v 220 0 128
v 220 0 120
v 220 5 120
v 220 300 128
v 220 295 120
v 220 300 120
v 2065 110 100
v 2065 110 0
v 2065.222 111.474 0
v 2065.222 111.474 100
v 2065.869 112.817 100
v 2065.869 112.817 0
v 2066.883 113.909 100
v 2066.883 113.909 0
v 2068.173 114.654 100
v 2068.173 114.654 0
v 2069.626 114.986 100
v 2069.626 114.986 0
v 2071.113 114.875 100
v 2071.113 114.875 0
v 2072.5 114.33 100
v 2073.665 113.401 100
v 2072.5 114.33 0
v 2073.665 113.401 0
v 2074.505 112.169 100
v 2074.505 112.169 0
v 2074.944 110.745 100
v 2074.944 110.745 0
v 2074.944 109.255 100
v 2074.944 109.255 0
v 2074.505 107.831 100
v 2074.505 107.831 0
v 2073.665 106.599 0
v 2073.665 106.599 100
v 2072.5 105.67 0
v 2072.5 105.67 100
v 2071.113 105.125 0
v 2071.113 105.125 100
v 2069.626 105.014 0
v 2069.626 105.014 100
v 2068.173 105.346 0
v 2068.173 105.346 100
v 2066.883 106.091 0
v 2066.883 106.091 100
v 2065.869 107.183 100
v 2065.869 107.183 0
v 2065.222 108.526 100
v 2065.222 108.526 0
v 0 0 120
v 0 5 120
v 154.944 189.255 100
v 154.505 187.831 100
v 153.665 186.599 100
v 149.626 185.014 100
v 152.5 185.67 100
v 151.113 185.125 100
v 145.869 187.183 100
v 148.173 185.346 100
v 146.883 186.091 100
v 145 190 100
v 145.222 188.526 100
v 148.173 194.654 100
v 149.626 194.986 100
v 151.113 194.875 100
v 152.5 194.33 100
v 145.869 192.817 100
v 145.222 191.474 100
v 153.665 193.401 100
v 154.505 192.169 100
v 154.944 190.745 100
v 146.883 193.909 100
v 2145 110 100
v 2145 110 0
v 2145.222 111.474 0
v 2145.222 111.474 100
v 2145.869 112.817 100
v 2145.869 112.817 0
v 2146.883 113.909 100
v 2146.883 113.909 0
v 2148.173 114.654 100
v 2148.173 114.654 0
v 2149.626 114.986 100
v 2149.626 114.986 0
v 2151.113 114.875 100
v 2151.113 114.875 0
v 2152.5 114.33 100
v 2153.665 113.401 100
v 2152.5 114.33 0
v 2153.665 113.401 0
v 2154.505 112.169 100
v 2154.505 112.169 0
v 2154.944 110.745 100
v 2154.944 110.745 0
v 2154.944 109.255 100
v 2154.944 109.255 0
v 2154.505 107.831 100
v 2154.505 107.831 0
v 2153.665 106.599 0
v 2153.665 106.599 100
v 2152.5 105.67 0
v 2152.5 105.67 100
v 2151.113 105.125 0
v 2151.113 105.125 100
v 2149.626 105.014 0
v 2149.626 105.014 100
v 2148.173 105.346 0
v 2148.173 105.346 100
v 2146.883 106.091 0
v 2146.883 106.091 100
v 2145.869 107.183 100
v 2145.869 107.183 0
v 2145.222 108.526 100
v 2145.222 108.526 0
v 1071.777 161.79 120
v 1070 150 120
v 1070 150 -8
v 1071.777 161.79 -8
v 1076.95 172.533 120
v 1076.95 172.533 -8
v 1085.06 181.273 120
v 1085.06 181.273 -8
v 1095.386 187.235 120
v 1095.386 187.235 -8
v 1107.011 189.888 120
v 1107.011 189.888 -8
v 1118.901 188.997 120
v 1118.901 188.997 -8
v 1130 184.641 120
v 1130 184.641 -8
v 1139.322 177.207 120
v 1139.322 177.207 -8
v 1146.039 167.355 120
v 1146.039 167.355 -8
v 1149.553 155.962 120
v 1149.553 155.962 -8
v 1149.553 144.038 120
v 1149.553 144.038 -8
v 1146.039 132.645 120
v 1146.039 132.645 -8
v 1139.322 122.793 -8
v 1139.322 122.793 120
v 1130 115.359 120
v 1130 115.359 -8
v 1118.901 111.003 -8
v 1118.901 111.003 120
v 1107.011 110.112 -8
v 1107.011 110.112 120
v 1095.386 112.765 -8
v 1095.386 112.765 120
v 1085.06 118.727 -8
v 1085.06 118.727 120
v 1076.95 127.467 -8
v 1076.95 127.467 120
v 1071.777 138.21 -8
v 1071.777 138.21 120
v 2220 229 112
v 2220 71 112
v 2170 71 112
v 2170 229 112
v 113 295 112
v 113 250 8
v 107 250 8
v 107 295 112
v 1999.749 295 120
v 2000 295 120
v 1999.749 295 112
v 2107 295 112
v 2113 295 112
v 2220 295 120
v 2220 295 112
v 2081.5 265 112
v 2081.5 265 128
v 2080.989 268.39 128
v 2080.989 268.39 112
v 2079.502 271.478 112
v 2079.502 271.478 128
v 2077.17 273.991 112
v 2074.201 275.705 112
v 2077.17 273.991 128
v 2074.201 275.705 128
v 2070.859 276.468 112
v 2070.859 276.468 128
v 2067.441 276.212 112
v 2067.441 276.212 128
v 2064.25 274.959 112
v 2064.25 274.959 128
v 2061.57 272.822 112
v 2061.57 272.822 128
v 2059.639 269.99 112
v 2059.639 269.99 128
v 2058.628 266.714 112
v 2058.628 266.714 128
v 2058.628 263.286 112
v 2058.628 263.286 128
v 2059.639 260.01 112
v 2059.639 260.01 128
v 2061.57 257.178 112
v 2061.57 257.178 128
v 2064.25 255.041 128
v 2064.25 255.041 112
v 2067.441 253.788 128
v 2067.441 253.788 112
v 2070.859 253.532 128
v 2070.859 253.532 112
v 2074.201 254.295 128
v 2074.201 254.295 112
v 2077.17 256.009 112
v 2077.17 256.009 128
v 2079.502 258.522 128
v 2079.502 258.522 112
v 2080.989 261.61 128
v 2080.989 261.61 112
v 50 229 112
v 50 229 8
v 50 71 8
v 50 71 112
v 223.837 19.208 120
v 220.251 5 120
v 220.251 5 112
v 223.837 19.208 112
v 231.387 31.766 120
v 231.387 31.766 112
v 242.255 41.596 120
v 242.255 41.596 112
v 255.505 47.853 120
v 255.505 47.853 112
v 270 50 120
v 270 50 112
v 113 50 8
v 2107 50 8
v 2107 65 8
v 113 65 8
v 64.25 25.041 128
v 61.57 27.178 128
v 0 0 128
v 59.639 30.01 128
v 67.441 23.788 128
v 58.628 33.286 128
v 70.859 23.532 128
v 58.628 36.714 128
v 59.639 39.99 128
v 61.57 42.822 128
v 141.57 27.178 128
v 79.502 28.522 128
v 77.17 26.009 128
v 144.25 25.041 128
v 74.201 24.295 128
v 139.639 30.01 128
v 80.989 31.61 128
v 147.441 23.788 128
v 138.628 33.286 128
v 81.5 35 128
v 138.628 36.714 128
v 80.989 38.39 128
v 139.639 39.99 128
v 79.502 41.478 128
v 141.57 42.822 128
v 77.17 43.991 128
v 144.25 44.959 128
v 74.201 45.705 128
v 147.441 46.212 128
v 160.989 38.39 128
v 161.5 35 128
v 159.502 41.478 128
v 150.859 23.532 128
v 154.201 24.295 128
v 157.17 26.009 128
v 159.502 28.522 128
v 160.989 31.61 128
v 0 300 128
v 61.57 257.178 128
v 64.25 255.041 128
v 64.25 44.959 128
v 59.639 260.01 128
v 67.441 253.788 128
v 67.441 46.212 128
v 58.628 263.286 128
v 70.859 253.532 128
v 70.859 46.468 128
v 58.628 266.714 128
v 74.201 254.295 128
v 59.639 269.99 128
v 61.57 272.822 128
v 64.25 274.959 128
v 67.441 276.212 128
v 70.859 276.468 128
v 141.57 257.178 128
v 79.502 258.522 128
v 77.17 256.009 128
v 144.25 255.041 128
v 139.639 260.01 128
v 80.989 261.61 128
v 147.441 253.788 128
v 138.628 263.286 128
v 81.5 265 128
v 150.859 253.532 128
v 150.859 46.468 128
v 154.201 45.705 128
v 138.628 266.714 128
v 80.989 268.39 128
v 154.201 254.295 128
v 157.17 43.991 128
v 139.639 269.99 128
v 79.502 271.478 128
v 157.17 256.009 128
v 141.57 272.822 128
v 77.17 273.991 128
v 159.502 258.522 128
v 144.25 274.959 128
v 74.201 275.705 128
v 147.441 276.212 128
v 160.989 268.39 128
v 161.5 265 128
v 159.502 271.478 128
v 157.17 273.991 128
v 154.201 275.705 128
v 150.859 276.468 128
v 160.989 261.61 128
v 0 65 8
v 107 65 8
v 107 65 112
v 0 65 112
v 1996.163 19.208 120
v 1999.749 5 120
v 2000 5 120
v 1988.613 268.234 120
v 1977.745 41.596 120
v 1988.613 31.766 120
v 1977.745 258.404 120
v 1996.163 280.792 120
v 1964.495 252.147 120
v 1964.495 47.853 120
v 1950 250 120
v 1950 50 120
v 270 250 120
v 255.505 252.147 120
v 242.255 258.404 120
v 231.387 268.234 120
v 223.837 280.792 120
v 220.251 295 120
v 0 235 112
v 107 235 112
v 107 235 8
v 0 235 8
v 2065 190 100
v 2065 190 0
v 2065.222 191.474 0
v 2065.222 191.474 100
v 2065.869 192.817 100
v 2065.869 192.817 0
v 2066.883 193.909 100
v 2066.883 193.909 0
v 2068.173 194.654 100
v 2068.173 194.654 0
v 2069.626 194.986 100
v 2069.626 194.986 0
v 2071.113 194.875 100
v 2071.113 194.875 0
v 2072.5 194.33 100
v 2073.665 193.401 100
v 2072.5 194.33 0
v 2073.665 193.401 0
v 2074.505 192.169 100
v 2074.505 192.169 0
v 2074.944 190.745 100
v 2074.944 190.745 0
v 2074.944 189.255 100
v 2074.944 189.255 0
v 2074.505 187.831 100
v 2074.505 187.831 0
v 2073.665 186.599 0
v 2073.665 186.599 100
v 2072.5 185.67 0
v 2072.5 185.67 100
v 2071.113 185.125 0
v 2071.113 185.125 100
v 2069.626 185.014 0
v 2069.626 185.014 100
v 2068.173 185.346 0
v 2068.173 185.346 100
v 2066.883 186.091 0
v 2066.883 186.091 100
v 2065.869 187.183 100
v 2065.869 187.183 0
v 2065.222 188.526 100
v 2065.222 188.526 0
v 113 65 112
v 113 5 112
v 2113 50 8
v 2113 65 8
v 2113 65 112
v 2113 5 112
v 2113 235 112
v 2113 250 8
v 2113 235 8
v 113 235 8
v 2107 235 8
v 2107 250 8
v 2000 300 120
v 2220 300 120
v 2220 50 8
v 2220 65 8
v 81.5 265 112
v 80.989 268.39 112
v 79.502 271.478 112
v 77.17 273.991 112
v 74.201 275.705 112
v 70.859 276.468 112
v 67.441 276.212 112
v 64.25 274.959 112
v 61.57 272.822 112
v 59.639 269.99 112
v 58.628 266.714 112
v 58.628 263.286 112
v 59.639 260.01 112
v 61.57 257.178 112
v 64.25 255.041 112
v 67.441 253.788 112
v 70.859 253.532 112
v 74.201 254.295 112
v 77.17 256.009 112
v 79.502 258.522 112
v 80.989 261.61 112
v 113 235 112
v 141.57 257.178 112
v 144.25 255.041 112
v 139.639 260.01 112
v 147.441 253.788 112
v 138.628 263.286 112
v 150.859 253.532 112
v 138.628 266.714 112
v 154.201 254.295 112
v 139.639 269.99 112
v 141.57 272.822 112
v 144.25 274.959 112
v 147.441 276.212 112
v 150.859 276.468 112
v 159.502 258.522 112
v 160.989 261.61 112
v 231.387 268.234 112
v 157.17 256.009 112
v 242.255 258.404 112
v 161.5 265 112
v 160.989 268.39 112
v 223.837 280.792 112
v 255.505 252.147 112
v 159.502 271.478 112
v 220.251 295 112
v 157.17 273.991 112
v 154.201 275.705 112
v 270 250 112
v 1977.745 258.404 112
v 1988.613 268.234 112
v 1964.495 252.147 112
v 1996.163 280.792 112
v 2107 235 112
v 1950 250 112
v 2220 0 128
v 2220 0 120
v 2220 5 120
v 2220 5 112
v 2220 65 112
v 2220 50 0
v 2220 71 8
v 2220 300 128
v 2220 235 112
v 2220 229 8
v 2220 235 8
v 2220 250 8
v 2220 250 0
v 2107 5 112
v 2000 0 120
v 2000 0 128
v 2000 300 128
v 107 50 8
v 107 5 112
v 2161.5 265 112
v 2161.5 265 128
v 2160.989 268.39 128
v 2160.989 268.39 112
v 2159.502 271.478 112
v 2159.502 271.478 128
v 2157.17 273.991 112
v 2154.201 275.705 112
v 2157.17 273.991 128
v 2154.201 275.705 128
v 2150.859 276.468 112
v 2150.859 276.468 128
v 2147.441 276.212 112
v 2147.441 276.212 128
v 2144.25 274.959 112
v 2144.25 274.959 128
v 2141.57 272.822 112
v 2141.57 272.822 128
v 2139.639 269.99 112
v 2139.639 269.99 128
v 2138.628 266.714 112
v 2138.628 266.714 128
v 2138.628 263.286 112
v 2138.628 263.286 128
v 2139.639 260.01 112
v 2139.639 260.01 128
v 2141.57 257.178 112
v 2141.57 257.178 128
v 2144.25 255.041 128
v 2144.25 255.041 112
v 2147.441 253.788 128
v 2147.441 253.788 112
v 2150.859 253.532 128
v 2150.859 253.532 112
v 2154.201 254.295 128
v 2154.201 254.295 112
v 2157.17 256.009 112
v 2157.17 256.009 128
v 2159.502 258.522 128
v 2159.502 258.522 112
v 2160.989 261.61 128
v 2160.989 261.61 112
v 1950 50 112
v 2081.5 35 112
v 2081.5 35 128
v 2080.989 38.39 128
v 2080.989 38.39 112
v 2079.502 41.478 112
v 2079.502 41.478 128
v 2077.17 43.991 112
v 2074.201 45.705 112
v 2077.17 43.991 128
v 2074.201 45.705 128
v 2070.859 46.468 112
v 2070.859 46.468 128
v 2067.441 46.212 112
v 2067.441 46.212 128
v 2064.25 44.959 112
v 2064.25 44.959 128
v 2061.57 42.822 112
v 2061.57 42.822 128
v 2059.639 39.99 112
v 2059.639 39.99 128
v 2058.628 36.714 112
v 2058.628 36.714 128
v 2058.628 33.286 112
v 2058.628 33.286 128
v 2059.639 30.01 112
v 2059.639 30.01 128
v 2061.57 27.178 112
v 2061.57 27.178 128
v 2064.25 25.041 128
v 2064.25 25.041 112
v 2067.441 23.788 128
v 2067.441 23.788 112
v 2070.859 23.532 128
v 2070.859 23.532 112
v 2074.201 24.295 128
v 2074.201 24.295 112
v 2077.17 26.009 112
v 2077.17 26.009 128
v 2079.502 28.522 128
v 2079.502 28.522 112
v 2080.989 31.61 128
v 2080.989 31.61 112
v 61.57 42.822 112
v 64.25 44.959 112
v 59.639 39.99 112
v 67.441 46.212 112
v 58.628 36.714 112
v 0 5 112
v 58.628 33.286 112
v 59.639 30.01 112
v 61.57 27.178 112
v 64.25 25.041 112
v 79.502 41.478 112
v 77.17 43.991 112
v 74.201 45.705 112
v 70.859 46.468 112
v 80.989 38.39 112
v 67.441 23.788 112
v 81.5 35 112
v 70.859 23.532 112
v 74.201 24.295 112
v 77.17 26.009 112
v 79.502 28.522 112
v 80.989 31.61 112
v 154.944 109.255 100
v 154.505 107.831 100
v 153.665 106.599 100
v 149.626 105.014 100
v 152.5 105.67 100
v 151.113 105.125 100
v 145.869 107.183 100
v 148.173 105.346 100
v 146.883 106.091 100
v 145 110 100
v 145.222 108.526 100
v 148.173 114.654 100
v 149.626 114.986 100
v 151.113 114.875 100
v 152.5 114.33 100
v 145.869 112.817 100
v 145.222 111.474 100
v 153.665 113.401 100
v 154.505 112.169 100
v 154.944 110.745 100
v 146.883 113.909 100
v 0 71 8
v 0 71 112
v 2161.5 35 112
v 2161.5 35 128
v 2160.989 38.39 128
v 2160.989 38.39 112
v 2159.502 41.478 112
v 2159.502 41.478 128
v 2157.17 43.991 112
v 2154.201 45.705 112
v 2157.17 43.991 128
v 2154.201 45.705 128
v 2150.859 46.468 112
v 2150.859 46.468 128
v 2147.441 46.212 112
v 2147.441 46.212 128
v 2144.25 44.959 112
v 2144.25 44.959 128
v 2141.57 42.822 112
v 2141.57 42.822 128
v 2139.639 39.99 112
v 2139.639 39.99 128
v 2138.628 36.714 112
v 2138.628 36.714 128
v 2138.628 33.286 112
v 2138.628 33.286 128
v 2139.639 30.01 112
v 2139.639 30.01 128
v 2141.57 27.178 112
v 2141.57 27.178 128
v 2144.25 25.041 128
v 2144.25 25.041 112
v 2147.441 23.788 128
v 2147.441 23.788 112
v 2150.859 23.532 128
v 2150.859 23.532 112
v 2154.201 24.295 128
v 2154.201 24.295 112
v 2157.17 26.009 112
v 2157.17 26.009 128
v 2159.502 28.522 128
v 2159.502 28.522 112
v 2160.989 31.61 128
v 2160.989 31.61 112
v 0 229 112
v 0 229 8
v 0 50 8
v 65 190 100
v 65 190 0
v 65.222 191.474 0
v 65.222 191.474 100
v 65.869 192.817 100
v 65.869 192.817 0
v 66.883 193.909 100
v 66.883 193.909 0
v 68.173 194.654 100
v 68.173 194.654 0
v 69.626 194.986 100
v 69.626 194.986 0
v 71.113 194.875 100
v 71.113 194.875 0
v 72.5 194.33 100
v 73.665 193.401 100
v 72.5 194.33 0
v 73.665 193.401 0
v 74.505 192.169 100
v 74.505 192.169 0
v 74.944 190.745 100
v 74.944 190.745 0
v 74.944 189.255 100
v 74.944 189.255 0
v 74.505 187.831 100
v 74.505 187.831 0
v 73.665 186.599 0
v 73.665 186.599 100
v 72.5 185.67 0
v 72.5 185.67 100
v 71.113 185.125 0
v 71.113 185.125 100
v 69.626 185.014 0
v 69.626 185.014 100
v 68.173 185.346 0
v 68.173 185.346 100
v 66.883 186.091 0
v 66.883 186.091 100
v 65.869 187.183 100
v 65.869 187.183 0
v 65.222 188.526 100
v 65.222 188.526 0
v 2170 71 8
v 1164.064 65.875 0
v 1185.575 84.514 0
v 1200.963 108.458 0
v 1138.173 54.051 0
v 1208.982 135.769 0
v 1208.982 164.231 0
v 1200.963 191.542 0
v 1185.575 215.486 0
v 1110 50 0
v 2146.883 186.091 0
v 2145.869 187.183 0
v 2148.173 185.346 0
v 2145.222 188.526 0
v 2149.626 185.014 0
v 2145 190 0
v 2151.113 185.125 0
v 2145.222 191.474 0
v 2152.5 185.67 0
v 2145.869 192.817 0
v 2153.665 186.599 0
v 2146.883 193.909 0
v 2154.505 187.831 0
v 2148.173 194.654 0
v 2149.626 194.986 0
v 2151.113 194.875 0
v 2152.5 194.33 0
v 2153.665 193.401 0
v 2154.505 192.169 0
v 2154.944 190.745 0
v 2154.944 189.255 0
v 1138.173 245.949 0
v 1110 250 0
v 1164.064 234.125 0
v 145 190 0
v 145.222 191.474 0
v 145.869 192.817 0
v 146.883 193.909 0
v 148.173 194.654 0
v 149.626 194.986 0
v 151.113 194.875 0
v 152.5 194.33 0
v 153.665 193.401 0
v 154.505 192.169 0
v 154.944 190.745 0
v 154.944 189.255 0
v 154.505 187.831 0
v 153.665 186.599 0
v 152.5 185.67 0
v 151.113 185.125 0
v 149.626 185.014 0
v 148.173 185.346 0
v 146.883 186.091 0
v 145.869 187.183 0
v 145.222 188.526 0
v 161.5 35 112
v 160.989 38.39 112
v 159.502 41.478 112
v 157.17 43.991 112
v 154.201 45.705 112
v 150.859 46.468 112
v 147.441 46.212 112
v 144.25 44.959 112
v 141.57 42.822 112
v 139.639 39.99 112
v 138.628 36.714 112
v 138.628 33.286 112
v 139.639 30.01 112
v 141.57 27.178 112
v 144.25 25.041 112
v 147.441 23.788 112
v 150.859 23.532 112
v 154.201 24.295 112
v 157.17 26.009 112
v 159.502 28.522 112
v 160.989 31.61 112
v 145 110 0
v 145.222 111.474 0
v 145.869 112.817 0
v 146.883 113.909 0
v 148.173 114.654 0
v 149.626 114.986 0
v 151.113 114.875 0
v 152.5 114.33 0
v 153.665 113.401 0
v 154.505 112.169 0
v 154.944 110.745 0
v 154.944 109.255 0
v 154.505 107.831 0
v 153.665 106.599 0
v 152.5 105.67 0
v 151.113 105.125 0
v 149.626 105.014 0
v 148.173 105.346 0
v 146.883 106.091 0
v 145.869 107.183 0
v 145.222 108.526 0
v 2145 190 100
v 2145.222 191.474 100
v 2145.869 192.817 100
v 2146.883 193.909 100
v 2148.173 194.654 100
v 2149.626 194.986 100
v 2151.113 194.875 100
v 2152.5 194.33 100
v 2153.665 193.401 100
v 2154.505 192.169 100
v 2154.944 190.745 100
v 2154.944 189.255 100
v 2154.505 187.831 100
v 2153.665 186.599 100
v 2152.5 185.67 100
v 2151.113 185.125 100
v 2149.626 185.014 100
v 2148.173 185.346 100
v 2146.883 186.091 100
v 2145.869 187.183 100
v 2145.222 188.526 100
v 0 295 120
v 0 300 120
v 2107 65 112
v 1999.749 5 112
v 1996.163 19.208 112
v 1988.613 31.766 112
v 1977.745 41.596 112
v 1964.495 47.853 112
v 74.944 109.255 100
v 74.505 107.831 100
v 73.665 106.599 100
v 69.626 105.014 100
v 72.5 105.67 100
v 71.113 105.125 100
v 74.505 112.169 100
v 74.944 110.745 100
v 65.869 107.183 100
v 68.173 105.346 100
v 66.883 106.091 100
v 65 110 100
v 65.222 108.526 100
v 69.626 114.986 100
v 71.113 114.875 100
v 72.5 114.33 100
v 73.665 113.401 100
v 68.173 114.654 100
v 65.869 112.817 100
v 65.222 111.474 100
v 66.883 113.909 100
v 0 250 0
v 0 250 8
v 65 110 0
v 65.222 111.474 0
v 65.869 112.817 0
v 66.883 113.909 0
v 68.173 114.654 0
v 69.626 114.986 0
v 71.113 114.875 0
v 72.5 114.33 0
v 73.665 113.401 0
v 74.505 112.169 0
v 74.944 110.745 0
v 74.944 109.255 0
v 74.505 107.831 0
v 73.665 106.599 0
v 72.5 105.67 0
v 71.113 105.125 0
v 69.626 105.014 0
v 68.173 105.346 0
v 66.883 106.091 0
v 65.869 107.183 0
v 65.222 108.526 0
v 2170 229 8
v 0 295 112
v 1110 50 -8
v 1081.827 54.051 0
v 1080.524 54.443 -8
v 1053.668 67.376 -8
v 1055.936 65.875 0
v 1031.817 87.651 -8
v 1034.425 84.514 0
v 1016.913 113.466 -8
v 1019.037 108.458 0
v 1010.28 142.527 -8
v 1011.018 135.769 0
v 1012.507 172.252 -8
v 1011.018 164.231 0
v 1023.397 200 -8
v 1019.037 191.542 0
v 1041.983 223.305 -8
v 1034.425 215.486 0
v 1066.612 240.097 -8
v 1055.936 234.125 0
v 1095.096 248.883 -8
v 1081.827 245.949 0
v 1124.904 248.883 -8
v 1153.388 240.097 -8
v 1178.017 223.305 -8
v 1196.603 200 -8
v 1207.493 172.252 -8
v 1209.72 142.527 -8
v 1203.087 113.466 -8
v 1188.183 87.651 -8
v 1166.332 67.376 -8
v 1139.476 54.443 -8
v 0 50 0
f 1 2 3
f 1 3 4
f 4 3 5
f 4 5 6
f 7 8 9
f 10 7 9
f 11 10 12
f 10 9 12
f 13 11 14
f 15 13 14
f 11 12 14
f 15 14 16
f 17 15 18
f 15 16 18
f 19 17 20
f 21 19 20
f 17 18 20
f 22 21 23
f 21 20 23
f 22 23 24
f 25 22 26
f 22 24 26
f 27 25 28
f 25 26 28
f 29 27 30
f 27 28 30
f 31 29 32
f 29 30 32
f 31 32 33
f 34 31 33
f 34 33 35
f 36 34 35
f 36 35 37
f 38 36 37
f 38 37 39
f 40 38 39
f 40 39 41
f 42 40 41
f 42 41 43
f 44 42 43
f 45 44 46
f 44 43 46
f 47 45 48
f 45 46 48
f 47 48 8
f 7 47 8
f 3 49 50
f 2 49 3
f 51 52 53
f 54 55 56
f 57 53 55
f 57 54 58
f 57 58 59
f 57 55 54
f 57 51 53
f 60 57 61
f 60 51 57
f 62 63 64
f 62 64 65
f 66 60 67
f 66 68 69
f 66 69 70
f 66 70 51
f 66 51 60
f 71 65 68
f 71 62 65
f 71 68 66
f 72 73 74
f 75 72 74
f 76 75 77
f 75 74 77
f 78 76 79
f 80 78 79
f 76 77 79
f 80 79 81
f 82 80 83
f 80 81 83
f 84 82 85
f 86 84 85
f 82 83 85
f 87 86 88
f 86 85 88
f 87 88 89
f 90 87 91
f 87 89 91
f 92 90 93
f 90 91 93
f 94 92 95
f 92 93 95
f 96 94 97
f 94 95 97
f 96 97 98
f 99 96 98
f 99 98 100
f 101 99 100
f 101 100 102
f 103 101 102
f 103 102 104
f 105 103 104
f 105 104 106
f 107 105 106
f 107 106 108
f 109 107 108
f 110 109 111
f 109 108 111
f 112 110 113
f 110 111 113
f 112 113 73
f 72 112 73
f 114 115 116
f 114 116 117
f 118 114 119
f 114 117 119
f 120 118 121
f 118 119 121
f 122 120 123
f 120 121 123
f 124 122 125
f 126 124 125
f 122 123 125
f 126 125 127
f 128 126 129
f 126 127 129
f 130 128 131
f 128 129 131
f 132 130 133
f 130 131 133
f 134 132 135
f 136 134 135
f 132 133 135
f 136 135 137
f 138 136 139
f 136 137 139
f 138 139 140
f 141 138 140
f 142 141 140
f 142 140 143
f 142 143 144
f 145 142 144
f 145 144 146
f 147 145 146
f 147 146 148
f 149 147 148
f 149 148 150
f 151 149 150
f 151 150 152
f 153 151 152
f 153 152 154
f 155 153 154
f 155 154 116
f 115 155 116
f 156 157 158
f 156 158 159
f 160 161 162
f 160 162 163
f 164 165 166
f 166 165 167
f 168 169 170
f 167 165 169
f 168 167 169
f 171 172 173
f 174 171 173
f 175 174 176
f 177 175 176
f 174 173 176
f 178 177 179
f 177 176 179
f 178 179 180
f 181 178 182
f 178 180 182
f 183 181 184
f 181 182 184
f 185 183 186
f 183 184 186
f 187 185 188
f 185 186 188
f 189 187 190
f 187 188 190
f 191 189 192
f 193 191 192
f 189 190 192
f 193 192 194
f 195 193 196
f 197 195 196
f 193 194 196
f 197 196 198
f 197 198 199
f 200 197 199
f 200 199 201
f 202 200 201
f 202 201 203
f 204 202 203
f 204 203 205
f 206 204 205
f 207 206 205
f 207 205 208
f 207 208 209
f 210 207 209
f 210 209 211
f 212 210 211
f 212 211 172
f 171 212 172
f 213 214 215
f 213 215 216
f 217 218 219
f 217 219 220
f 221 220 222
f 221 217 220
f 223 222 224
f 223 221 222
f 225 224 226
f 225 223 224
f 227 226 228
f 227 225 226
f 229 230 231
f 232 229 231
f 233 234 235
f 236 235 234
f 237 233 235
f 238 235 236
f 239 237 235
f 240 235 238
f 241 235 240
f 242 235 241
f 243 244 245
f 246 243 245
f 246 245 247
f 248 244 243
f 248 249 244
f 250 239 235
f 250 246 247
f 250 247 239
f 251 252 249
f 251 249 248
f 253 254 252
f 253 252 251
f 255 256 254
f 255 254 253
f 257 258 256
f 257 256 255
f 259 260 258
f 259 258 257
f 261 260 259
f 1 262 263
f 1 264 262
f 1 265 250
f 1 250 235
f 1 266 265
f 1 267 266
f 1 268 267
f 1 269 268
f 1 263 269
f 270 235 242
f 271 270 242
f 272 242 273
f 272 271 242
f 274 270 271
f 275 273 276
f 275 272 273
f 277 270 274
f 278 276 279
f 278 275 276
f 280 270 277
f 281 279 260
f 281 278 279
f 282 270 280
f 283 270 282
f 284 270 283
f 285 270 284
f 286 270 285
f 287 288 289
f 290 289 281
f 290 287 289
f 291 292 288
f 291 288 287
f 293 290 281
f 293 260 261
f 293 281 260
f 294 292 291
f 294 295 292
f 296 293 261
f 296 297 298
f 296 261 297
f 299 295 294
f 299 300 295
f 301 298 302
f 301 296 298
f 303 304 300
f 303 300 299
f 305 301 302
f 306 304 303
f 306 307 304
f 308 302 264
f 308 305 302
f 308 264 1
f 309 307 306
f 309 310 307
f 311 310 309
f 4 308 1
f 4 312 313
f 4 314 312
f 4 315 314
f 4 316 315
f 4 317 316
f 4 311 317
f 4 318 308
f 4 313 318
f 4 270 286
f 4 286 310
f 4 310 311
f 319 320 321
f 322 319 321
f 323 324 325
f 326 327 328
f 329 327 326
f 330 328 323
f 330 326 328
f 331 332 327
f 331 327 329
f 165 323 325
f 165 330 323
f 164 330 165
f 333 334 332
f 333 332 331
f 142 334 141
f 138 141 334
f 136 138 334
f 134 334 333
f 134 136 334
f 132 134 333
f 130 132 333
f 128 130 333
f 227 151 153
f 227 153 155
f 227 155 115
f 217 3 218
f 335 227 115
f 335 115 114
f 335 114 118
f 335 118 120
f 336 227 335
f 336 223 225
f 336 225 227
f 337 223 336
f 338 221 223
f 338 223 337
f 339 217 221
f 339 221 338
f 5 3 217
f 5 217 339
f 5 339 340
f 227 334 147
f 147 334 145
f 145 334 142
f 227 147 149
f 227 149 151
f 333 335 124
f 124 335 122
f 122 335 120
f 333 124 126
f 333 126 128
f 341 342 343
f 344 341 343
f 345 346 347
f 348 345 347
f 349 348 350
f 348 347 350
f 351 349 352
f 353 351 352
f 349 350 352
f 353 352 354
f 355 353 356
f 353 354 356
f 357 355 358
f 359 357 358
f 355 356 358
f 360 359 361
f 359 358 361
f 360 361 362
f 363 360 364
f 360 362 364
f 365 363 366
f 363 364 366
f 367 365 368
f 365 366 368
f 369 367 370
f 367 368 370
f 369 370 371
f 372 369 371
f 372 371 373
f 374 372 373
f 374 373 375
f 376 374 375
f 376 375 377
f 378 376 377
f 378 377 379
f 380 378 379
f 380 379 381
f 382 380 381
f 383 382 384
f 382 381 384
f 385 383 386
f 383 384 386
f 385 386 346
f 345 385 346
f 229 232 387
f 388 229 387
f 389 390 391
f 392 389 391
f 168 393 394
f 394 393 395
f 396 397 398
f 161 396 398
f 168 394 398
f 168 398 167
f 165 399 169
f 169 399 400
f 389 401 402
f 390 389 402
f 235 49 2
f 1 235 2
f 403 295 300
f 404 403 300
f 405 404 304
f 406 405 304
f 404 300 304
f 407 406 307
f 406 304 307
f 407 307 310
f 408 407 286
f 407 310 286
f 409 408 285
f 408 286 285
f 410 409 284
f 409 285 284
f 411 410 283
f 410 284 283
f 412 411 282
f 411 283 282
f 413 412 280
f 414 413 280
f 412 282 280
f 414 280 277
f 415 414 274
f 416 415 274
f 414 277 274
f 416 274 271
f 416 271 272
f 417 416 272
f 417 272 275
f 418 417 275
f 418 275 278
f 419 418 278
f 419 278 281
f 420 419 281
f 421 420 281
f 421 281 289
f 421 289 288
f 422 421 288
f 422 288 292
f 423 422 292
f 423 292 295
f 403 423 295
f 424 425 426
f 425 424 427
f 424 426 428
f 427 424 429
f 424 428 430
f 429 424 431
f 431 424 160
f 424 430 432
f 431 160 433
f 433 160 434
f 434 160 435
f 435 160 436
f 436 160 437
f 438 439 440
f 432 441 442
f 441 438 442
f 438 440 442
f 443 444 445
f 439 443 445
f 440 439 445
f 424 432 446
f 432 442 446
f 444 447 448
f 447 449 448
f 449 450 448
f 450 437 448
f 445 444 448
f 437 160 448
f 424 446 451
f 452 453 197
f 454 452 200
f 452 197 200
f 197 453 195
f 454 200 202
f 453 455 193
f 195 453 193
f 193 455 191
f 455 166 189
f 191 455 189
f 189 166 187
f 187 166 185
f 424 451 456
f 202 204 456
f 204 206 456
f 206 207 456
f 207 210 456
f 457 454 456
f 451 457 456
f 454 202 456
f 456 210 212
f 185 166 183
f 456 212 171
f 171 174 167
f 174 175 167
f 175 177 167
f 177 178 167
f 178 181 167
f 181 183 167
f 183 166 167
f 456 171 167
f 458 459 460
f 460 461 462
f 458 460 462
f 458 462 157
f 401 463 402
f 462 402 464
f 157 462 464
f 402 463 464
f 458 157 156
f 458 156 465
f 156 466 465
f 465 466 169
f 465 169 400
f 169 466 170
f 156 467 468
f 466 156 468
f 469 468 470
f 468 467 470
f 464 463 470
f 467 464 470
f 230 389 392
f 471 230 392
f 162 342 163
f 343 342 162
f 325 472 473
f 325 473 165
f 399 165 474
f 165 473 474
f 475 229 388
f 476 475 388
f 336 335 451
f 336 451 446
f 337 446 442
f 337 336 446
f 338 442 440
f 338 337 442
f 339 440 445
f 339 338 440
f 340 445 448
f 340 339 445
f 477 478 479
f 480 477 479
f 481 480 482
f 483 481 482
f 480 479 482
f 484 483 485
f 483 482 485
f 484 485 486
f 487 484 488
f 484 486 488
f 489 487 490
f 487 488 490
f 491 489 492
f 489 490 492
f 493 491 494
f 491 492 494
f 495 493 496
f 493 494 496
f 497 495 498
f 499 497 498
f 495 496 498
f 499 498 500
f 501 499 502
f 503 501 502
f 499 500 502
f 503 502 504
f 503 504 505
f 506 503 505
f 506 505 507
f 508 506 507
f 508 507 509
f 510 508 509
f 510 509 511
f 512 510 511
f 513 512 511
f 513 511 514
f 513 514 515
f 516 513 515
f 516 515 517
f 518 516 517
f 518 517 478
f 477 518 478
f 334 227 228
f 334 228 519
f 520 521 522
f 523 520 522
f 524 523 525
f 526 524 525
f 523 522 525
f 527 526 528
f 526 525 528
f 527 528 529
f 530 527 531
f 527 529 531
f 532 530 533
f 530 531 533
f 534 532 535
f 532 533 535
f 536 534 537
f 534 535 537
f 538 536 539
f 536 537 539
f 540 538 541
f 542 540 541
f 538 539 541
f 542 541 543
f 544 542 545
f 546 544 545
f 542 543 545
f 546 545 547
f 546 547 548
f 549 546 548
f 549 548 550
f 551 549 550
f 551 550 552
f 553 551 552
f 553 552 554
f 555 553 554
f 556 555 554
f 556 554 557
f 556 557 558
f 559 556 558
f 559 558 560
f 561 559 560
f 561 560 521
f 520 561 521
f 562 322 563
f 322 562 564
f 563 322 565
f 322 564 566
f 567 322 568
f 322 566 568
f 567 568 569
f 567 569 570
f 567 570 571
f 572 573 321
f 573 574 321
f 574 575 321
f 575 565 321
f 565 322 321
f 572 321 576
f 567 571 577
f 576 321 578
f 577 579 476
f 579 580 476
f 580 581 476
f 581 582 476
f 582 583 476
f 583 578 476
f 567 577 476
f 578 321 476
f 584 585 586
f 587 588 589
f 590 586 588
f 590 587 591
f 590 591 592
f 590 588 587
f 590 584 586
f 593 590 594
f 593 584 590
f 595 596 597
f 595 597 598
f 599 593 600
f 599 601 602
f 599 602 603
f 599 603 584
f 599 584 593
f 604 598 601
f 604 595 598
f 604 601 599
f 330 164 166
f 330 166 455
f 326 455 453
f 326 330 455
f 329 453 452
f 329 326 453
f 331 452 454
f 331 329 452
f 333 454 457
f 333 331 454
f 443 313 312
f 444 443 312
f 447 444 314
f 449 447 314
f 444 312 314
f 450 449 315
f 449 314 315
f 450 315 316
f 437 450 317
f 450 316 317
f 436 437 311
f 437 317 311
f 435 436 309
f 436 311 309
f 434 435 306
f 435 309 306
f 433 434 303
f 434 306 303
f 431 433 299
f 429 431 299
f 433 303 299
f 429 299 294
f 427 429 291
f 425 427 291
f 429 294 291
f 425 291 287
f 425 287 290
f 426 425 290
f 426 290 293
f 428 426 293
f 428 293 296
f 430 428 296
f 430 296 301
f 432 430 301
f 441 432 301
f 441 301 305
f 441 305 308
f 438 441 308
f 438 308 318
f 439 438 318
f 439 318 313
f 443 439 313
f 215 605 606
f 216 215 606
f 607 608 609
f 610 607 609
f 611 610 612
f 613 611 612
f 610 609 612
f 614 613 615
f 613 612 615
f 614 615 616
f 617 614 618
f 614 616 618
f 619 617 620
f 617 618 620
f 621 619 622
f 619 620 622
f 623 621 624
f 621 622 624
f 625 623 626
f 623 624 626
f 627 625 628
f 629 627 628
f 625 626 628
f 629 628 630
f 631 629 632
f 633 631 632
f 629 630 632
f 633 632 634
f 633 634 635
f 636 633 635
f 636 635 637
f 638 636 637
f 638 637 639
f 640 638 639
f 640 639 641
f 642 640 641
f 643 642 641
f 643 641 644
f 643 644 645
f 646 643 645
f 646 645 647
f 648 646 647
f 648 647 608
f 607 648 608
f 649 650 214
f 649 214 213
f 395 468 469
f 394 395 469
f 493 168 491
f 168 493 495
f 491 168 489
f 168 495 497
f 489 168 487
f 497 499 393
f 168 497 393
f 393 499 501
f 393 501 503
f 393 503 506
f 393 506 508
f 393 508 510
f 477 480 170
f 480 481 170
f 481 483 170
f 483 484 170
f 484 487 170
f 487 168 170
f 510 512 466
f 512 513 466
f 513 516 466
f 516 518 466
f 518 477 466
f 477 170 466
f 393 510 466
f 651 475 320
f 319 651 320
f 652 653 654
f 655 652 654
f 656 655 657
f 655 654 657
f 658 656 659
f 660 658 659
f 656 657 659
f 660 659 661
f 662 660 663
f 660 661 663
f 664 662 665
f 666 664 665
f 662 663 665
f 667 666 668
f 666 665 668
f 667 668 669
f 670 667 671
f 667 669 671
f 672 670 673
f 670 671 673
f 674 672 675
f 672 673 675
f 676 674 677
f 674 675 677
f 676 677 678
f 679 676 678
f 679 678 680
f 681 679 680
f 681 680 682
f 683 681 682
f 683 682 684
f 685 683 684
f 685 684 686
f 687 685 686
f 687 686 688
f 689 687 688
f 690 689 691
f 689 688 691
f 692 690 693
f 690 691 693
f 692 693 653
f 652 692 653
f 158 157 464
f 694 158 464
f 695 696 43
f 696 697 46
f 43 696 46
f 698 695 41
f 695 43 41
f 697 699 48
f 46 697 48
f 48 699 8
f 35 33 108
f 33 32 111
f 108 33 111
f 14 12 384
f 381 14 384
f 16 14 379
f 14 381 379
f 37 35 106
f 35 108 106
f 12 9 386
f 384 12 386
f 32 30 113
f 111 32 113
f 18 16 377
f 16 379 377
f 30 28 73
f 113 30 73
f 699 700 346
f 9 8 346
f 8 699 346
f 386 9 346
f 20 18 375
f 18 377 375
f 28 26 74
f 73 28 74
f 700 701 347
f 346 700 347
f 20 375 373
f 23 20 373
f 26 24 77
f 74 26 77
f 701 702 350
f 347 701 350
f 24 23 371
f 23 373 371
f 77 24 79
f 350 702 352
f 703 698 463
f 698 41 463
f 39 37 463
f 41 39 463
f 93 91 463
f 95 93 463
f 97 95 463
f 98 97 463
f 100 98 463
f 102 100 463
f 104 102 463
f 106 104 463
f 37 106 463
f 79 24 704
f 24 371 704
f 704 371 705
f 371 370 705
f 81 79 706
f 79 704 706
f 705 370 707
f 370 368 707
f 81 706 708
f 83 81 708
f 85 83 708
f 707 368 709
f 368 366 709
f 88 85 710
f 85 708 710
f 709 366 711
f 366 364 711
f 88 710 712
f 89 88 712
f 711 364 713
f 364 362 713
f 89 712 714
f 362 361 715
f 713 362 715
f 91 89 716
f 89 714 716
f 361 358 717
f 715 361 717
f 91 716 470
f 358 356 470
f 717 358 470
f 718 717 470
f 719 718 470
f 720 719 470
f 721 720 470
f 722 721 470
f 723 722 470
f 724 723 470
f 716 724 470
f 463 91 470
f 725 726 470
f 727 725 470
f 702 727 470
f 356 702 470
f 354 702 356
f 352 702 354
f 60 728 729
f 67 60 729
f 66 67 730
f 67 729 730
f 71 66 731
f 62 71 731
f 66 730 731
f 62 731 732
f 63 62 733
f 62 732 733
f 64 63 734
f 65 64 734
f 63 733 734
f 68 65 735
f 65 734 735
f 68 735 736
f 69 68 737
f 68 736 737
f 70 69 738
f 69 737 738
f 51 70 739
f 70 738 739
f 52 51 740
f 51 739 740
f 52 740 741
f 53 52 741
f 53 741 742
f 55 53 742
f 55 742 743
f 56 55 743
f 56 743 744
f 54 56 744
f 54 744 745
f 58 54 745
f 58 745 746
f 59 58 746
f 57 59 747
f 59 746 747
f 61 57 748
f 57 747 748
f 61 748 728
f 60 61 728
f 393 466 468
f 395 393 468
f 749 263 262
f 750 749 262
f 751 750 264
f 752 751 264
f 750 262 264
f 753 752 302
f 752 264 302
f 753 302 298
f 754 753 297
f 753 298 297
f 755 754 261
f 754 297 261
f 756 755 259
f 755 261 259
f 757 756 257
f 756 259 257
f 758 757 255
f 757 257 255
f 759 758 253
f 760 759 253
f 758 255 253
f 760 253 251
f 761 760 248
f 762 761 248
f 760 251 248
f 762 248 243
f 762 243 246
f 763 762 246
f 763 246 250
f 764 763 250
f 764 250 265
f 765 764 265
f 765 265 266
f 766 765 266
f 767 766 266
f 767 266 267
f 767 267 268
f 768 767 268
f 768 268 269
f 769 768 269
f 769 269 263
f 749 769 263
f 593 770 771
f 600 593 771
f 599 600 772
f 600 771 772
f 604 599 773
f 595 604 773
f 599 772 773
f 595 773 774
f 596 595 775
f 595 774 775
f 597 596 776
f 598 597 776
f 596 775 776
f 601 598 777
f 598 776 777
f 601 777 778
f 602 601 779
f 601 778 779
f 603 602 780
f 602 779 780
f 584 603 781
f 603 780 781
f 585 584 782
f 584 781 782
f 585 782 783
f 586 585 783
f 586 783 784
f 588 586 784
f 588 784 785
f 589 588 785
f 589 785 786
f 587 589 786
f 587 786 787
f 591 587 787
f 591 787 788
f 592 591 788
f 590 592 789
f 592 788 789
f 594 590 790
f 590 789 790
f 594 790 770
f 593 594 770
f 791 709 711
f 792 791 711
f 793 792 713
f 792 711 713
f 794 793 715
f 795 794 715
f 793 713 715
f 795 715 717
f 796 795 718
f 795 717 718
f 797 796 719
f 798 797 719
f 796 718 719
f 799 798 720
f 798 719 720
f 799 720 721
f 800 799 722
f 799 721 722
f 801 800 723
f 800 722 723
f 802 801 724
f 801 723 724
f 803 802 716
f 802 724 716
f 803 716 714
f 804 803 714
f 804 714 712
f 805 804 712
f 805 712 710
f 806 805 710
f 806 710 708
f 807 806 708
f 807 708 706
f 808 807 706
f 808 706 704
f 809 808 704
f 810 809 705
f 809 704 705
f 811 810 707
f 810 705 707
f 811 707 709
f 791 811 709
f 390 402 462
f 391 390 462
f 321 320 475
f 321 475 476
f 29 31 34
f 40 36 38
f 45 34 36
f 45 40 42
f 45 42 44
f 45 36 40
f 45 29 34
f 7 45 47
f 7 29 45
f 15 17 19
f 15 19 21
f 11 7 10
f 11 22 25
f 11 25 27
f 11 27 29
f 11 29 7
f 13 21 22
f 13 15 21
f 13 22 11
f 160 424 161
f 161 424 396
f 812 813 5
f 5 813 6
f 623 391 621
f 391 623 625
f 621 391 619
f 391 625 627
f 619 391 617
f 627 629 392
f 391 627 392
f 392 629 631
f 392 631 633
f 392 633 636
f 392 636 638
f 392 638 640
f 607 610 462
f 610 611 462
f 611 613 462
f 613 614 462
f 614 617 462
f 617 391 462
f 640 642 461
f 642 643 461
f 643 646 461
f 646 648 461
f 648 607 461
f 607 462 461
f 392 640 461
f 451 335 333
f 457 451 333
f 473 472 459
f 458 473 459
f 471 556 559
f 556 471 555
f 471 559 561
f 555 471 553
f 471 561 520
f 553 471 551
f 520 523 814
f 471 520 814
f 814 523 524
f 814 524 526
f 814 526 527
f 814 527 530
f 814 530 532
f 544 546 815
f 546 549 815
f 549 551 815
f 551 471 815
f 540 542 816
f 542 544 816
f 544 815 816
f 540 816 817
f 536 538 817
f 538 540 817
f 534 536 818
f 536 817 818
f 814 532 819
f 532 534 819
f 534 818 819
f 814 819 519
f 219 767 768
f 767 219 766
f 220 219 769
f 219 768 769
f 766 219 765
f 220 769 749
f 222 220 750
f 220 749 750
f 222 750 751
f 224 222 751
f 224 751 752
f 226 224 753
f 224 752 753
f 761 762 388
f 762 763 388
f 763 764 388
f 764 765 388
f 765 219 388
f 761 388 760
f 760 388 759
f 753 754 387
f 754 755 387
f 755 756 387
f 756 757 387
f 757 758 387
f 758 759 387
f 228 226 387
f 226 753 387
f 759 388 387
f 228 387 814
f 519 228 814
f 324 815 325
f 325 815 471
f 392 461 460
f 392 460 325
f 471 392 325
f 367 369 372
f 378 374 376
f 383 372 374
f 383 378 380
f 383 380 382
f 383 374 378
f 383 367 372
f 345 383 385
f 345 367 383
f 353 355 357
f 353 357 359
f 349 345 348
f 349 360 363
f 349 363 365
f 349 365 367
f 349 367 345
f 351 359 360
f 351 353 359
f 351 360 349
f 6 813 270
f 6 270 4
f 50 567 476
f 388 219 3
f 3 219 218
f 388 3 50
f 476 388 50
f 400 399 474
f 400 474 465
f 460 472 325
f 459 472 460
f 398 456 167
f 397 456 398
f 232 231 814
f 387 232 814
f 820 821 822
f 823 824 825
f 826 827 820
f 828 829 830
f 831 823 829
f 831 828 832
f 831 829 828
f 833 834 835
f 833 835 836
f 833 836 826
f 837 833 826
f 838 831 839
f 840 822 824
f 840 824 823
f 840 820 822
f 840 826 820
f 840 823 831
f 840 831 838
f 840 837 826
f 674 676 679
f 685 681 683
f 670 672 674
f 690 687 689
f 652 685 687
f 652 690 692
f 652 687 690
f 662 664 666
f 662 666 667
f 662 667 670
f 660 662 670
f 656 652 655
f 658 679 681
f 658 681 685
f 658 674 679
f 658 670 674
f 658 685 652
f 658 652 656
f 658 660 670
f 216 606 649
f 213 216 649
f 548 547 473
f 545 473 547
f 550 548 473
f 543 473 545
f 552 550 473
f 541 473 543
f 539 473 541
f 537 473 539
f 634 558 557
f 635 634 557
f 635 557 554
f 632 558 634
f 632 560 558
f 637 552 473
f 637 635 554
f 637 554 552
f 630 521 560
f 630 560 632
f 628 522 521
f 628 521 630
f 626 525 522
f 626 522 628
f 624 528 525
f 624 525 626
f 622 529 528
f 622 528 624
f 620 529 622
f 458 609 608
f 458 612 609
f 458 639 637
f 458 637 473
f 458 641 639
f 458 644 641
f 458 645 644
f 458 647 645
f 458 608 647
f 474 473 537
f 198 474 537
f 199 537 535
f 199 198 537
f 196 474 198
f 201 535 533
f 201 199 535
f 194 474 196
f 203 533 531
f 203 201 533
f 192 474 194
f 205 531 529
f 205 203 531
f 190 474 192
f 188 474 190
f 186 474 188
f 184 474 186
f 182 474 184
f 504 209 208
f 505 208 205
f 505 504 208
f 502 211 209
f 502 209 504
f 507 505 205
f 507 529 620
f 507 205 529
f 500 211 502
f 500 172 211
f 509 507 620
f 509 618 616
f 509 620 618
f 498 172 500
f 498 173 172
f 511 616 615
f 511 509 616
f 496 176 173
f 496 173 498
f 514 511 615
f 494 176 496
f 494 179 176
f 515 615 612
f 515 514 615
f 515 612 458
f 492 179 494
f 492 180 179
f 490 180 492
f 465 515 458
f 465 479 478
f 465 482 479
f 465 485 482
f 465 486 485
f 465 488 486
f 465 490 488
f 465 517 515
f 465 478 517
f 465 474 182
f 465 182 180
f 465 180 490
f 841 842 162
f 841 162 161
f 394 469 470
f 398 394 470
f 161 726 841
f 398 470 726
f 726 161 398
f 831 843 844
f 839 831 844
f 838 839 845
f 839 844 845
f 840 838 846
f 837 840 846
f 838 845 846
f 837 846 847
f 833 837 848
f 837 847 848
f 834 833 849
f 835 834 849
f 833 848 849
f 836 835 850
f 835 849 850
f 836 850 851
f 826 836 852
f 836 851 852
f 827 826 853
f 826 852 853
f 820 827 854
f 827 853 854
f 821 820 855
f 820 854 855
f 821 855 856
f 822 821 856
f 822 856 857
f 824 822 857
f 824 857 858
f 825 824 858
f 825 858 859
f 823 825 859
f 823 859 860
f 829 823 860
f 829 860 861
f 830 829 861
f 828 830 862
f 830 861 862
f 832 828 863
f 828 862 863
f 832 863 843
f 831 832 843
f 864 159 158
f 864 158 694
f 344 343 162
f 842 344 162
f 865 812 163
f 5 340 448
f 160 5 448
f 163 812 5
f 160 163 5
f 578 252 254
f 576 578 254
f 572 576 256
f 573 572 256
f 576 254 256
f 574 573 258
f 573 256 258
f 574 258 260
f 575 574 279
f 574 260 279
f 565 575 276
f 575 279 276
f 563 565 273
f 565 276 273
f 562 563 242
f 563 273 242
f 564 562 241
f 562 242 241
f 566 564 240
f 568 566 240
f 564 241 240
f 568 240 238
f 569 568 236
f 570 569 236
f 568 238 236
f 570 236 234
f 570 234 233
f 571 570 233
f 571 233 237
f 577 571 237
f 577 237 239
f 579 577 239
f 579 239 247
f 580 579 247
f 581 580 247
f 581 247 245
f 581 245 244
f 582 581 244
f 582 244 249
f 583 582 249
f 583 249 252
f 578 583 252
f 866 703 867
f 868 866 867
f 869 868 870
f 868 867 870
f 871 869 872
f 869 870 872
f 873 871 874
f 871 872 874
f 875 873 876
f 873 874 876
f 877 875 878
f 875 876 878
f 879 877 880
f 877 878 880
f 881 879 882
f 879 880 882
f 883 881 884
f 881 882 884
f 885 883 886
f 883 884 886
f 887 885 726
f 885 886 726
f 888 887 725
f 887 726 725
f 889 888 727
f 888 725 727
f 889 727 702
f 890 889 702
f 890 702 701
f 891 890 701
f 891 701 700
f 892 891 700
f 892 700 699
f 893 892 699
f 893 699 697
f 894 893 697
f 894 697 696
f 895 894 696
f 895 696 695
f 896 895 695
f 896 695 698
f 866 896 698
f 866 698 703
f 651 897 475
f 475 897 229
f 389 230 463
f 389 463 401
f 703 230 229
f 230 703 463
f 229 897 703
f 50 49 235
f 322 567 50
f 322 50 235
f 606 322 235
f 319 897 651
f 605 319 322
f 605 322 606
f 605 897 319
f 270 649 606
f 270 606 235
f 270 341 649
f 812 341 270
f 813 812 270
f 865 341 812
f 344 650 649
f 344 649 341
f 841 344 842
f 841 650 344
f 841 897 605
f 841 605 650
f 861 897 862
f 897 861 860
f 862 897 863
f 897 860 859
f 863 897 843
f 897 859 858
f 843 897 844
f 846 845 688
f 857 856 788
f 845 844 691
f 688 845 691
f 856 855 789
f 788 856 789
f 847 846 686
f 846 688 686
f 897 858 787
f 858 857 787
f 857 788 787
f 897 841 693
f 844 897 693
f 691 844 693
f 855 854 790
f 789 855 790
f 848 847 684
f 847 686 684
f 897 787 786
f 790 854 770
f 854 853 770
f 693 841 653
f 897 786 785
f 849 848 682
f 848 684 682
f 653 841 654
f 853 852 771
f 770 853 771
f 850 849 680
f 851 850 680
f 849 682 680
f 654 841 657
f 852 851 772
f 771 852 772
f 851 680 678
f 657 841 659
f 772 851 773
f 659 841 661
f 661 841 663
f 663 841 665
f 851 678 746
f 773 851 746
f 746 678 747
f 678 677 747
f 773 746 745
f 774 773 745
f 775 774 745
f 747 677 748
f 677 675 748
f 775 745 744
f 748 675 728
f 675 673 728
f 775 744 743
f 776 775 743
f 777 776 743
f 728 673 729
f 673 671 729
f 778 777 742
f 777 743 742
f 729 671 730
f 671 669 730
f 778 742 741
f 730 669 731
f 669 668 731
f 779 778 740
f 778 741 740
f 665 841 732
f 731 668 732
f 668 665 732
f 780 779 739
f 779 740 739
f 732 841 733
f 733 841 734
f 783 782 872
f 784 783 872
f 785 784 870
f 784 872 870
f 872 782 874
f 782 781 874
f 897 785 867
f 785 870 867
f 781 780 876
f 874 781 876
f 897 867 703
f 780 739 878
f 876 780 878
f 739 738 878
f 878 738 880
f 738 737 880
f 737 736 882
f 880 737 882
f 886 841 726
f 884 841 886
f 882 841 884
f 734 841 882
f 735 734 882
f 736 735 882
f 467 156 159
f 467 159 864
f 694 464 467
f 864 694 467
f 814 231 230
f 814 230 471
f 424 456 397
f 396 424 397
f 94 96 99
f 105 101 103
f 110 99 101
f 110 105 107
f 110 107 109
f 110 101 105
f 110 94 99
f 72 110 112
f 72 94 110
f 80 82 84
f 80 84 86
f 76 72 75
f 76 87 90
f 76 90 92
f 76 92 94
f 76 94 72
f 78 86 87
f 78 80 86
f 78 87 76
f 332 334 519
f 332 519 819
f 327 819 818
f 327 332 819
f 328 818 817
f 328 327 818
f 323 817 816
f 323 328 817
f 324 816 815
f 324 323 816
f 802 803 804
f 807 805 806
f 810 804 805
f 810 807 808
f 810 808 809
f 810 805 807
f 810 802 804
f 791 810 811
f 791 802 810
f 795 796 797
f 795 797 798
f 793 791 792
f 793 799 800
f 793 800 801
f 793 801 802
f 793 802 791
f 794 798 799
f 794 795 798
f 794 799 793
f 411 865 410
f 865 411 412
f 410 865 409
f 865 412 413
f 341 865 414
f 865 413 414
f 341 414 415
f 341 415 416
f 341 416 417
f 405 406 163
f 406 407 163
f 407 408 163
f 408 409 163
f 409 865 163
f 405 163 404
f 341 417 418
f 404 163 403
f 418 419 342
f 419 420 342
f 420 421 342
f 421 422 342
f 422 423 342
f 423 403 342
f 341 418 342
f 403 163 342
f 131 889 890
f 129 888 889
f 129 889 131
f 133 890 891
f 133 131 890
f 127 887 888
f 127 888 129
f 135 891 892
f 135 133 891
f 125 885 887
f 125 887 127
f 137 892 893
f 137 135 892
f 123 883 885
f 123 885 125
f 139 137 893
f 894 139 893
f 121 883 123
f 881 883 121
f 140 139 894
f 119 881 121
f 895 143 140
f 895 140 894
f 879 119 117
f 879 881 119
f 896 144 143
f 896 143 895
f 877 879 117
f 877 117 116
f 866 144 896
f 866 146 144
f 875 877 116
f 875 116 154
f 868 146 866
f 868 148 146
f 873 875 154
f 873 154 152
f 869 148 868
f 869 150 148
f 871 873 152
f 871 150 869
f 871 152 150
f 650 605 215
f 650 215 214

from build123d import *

# Parameters (mm, degrees)
SKETCH_1_W                       = 2220
SKETCH_1_H                       = 300
EXTRUDE_1_DEPTH                  = 120
SKETCH_2_W                       = 1780
SKETCH_2_H                       = 50
CUT_EXTRUDE_1_DEPTH              = 2244.390291501
SKETCH_3_W                       = 220
SKETCH_3_H                       = 300
EXTRUDE_2_DEPTH                  = 8
SKETCH_4_W                       = 2220
SKETCH_4_H                       = 120
CUT_EXTRUDE_2_DEPTH              = 5
SKETCH_5_W                       = 2220
SKETCH_5_H                       = 120
CUT_EXTRUDE_3_DEPTH              = 5
CUT_EXTRUDE_11_DEPTH             = 2244.832435812
SKETCH_14_W                      = 6
SKETCH_14_H                      = 104
EXTRUDE_3_DEPTH                  = 60
SKETCH_16_W                      = 6
SKETCH_16_H                      = 104
EXTRUDE_4_DEPTH                  = 60
CUT_EXTRUDE_12_DEPTH             = 2139.025490961
PATTERN_LINEAR_2_COUNT           = 2
PATTERN_LINEAR_2_PITCH           = 2000
FILLET_3_R                       = 50
SKETCH_17_W                      = 104
SKETCH_17_H                      = 158
CUT_EXTRUDE_13_DEPTH             = 50
SKETCH_18_W                      = 104
SKETCH_18_H                      = 158
CUT_EXTRUDE_14_DEPTH             = 50
SKETCH_19_R                      = 100
EXTRUDE_5_DEPTH                  = 8
SKETCH_20_R                      = 40
CUT_EXTRUDE_15_DEPTH             = 2245.303009845
SKETCH_21_R                      = 11.5
CUT_EXTRUDE_16_DEPTH             = 2245.303009845
PATTERN_LINEAR_3_COUNT           = 2
PATTERN_LINEAR_3_PITCH           = 80
PATTERN_LINEAR_3_COUNT_DIR2      = 2
PATTERN_LINEAR_3_PITCH_DIR2      = 230
PATTERN_LINEAR_4_COUNT           = 2
PATTERN_LINEAR_4_PITCH           = 2000
PATTERN_LINEAR_4_COPY_1_SKETCH_R = 11.5
PATTERN_LINEAR_4_COPY_1_DEPTH    = 2245.303009845
PATTERN_LINEAR_4_COPY_2_SKETCH_R = 11.5
PATTERN_LINEAR_4_COPY_2_DEPTH    = 2245.303009845
PATTERN_LINEAR_4_COPY_3_SKETCH_R = 11.5
PATTERN_LINEAR_4_COPY_3_DEPTH    = 2245.303009845
SKETCH_22_R                      = 5
CUT_EXTRUDE_17_DEPTH             = 100
PATTERN_LINEAR_5_COUNT           = 2
PATTERN_LINEAR_5_PITCH           = 80
PATTERN_LINEAR_5_COUNT_DIR2      = 2
PATTERN_LINEAR_5_PITCH_DIR2      = 80
PATTERN_LINEAR_6_COUNT           = 2
PATTERN_LINEAR_6_PITCH           = 2000
PATTERN_LINEAR_6_COPY_1_SKETCH_R = 5
PATTERN_LINEAR_6_COPY_1_DEPTH    = 100
PATTERN_LINEAR_6_COPY_2_SKETCH_R = 5
PATTERN_LINEAR_6_COPY_2_DEPTH    = 100
PATTERN_LINEAR_6_COPY_3_SKETCH_R = 5
PATTERN_LINEAR_6_COPY_3_DEPTH    = 100


with BuildPart() as part:
    # 草图1 → 凸台-拉伸1 (new body)
    with BuildSketch(Plane.XY):
        with Locations((1110, 150)):
            Rectangle(SKETCH_1_W, SKETCH_1_H)
    extrude(amount=EXTRUDE_1_DEPTH)

    # 草图2 → 切除-拉伸1 (cut, through all)
    with BuildSketch(Plane.XY.offset(120)):
        with Locations((1110, 275)):
            Rectangle(SKETCH_2_W, SKETCH_2_H)
        with Locations((1110, 25)):
            Rectangle(SKETCH_2_W, SKETCH_2_H)
    extrude(amount=-CUT_EXTRUDE_1_DEPTH, mode=Mode.SUBTRACT)

    # 草图3 → 凸台-拉伸2 (add)
    with BuildSketch(Plane.XY.offset(120)):
        with Locations((110, 150)):
            Rectangle(SKETCH_3_W, SKETCH_3_H)
        with Locations((2110, 150)):
            Rectangle(SKETCH_3_W, SKETCH_3_H)
    extrude(amount=EXTRUDE_2_DEPTH)

    # 草图4 → 切除-拉伸2 (cut)
    with BuildSketch(Plane(origin=(0, 300, 0), x_dir=(1, 0, 0), z_dir=(0, 1, 0))):
        with Locations((1110, -60)):
            Rectangle(SKETCH_4_W, SKETCH_4_H)
    extrude(amount=-CUT_EXTRUDE_2_DEPTH, mode=Mode.SUBTRACT)

    # 草图5 → 切除-拉伸3 (cut)
    with BuildSketch(Plane.XZ):
        with Locations((1110, 60)):
            Rectangle(SKETCH_5_W, SKETCH_5_H)
    extrude(amount=-CUT_EXTRUDE_3_DEPTH, mode=Mode.SUBTRACT)

    # 草图13 → 切除-拉伸11 (cut, through all)
    with BuildSketch(Plane(origin=(2220, 0, 0), x_dir=(0, 0, -1), z_dir=(1, 0, 0))):
        Polygon((-112, 235), (-8, 235), (-8, 250), (0, 250), (0, 295), (-112, 295), align=None)
        Polygon((-112, 5), (0, 5), (0, 50), (-8, 50), (-8, 65), (-112, 65), align=None)
    extrude(amount=-CUT_EXTRUDE_11_DEPTH, mode=Mode.SUBTRACT)

    # 草图14 → 凸台-拉伸3 (add)
    with BuildSketch(Plane(origin=(0, 235, 0), x_dir=(1, 0, 0), z_dir=(0, 1, 0))):
        with Locations((2110, -60)):
            Rectangle(SKETCH_14_W, SKETCH_14_H)
    extrude_3 = extrude(amount=EXTRUDE_3_DEPTH)

    # 草图16 → 凸台-拉伸4 (add)
    with BuildSketch(Plane.XZ.offset(-65)):
        with Locations((2110, 60)):
            Rectangle(SKETCH_16_W, SKETCH_16_H)
    extrude_4 = extrude(amount=EXTRUDE_4_DEPTH)

    # 草图15 → 切除-拉伸12 (cut, through all)
    with BuildSketch(Plane(origin=(2113, 0, 0), x_dir=(0, 0, -1), z_dir=(1, 0, 0))):
        Polygon((-8, 295), (-8, 250), (-112, 295), align=None)
        Polygon((-8, 50), (-112, 5), (-8, 5), align=None)
    cut_extrude_12 = extrude(amount=-CUT_EXTRUDE_12_DEPTH, mode=Mode.SUBTRACT)

    # 阵列(线性)2: 凸台-拉伸3, 凸台-拉伸4, 切除-拉伸12 ×2
    with Locations(*[(-i * PATTERN_LINEAR_2_PITCH, 0, 0) for i in range(1, PATTERN_LINEAR_2_COUNT)]):
        add(extrude_3)
        add(extrude_4)
        add(cut_extrude_12, mode=Mode.SUBTRACT)

    # 圆角3
    # the kernel refuses this fillet: 50 mm, written as the material it adds along each edge
    with BuildSketch(Plane(origin=(220, 250, 120), x_dir=(0, 1, 0), z_dir=(0, 0, -1))) as fillet_3_piece_1_section:
        with BuildLine():
            CenterArc((FILLET_3_R, FILLET_3_R), FILLET_3_R, 180, 90)
            Line((0, FILLET_3_R), (0, 0))
            Line((0, 0), (FILLET_3_R, 0))
        make_face()
    fillet_3_piece_1 = extrude(amount=8, mode=Mode.PRIVATE)
    fillet_3_piece_1 = split(fillet_3_piece_1, bisect_by=Plane(origin=(231.177032, 295, 116), z_dir=(0, -1, 0)), keep=Keep.TOP, mode=Mode.PRIVATE)
    add(fillet_3_piece_1)
    with BuildSketch(Plane(origin=(2000, 250, 120), x_dir=(-1, 0, 0), z_dir=(0, 0, -1))) as fillet_3_piece_2_section:
        with BuildLine():
            CenterArc((FILLET_3_R, FILLET_3_R), FILLET_3_R, 180, 90)
            Line((0, FILLET_3_R), (0, 0))
            Line((0, 0), (FILLET_3_R, 0))
        make_face()
    fillet_3_piece_2 = extrude(amount=8, mode=Mode.PRIVATE)
    fillet_3_piece_2 = split(fillet_3_piece_2, bisect_by=Plane(origin=(1988.822968, 295, 116), z_dir=(0, -1, 0)), keep=Keep.TOP, mode=Mode.PRIVATE)
    add(fillet_3_piece_2)
    with BuildSketch(Plane(origin=(2000, 50, 120), x_dir=(-1, 0, 0), z_dir=(0, 0, -1))) as fillet_3_piece_3_section:
        with BuildLine():
            CenterArc((FILLET_3_R, -FILLET_3_R), FILLET_3_R, 90, 90)
            Line((0, -FILLET_3_R), (0, 0))
            Line((0, 0), (FILLET_3_R, 0))
        make_face()
    fillet_3_piece_3 = extrude(amount=8, mode=Mode.PRIVATE)
    fillet_3_piece_3 = split(fillet_3_piece_3, bisect_by=Plane(origin=(1988.822968, 5, 116), z_dir=(0, 1, 0)), keep=Keep.TOP, mode=Mode.PRIVATE)
    add(fillet_3_piece_3)
    with BuildSketch(Plane(origin=(220, 50, 120), x_dir=(0, -1, 0), z_dir=(0, 0, -1))) as fillet_3_piece_4_section:
        with BuildLine():
            CenterArc((FILLET_3_R, -FILLET_3_R), FILLET_3_R, 90, 90)
            Line((0, -FILLET_3_R), (0, 0))
            Line((0, 0), (FILLET_3_R, 0))
        make_face()
    fillet_3_piece_4 = extrude(amount=8, mode=Mode.PRIVATE)
    fillet_3_piece_4 = split(fillet_3_piece_4, bisect_by=Plane(origin=(231.177032, 5, 116), z_dir=(0, 1, 0)), keep=Keep.TOP, mode=Mode.PRIVATE)
    add(fillet_3_piece_4)

    # 草图17 → 切除-拉伸13 (cut)
    with BuildSketch(Plane.ZY):
        with Locations((60, 150)):
            Rectangle(SKETCH_17_W, SKETCH_17_H)
    extrude(amount=-CUT_EXTRUDE_13_DEPTH, mode=Mode.SUBTRACT)

    # 草图18 → 切除-拉伸14 (cut)
    with BuildSketch(Plane(origin=(2220, 0, 0), x_dir=(0, 0, -1), z_dir=(1, 0, 0))):
        with Locations((-60, 150)):
            Rectangle(SKETCH_18_W, SKETCH_18_H)
    extrude(amount=-CUT_EXTRUDE_14_DEPTH, mode=Mode.SUBTRACT)

    # 草图19 → 凸台-拉伸5 (add)
    with BuildSketch(Plane(origin=(0, 0, 0), x_dir=(-1, 0, 0), z_dir=(0, 0, -1))):
        with Locations(Location((-1110, 150, 0), (0, 0, 270))):
            Circle(SKETCH_19_R)
    extrude(amount=EXTRUDE_5_DEPTH)

    # 草图20 → 切除-拉伸15 (cut, through all)
    with BuildSketch(Plane(origin=(0, 0, -8), x_dir=(-1, 0, 0), z_dir=(0, 0, -1))):
        with Locations((-1110, 150)):
            Circle(SKETCH_20_R)
    extrude(amount=-CUT_EXTRUDE_15_DEPTH, mode=Mode.SUBTRACT)

    # 草图21 → 切除-拉伸16 (cut, through all)
    with BuildSketch(Plane.XY.offset(128)):
        with Locations((2150, 35)):
            Circle(SKETCH_21_R)
    cut_extrude_16 = extrude(amount=-CUT_EXTRUDE_16_DEPTH, mode=Mode.SUBTRACT)

    # 阵列(线性)3: Cut-Extrude 16 2 × 2
    with Locations(*[(-i * PATTERN_LINEAR_3_PITCH, j * PATTERN_LINEAR_3_PITCH_DIR2, 0) for i in range(PATTERN_LINEAR_3_COUNT) for j in range(PATTERN_LINEAR_3_COUNT_DIR2) if (i, j) != (0, 0)]):
        add(cut_extrude_16, mode=Mode.SUBTRACT)

    # 阵列(线性)4: 切除-拉伸16 ×2
    with Locations(*[(-i * PATTERN_LINEAR_4_PITCH, 0, 0) for i in range(1, PATTERN_LINEAR_4_COUNT)]):
        add(cut_extrude_16, mode=Mode.SUBTRACT)

    # 阵列(线性)4 copy 1 sketch → 阵列(线性)4 copy 1 (cut, through all)
    with BuildSketch(Plane(origin=(-2000, 230, 128), x_dir=(1, 0, 0), z_dir=(0, 0, 1))):
        with Locations((2150, 35)):
            Circle(PATTERN_LINEAR_4_COPY_1_SKETCH_R)
    extrude(amount=-PATTERN_LINEAR_4_COPY_1_DEPTH, mode=Mode.SUBTRACT)

    # 阵列(线性)4 copy 2 sketch → 阵列(线性)4 copy 2 (cut, through all)
    with BuildSketch(Plane(origin=(-2080, 0, 128), x_dir=(1, 0, 0), z_dir=(0, 0, 1))):
        with Locations((2150, 35)):
            Circle(PATTERN_LINEAR_4_COPY_2_SKETCH_R)
    extrude(amount=-PATTERN_LINEAR_4_COPY_2_DEPTH, mode=Mode.SUBTRACT)

    # 阵列(线性)4 copy 3 sketch → 阵列(线性)4 copy 3 (cut, through all)
    with BuildSketch(Plane(origin=(-2080, 230, 128), x_dir=(1, 0, 0), z_dir=(0, 0, 1))):
        with Locations((2150, 35)):
            Circle(PATTERN_LINEAR_4_COPY_3_SKETCH_R)
    extrude(amount=-PATTERN_LINEAR_4_COPY_3_DEPTH, mode=Mode.SUBTRACT)

    # 草图22 → 切除-拉伸17 (cut)
    with BuildSketch(Plane(origin=(0, 0, 0), x_dir=(-1, 0, 0), z_dir=(0, 0, -1))):
        with Locations((-2150, 190)):
            Circle(SKETCH_22_R)
    cut_extrude_17 = extrude(amount=-CUT_EXTRUDE_17_DEPTH, mode=Mode.SUBTRACT)

    # 阵列(线性)5: Cut-Extrude 17 2 × 2
    with Locations(*[(-i * PATTERN_LINEAR_5_PITCH, -j * PATTERN_LINEAR_5_PITCH_DIR2, 0) for i in range(PATTERN_LINEAR_5_COUNT) for j in range(PATTERN_LINEAR_5_COUNT_DIR2) if (i, j) != (0, 0)]):
        add(cut_extrude_17, mode=Mode.SUBTRACT)

    # 阵列(线性)6: 切除-拉伸17 ×2
    with Locations(*[(-i * PATTERN_LINEAR_6_PITCH, 0, 0) for i in range(1, PATTERN_LINEAR_6_COUNT)]):
        add(cut_extrude_17, mode=Mode.SUBTRACT)

    # 阵列(线性)6 copy 1 sketch → 阵列(线性)6 copy 1 (cut)
    with BuildSketch(Plane(origin=(-2000, -80, 0), x_dir=(-1, 0, 0), z_dir=(0, 0, -1))):
        with Locations((-2150, 190)):
            Circle(PATTERN_LINEAR_6_COPY_1_SKETCH_R)
    extrude(amount=-PATTERN_LINEAR_6_COPY_1_DEPTH, mode=Mode.SUBTRACT)

    # 阵列(线性)6 copy 2 sketch → 阵列(线性)6 copy 2 (cut)
    with BuildSketch(Plane(origin=(-2080, 0, 0), x_dir=(-1, 0, 0), z_dir=(0, 0, -1))):
        with Locations((-2150, 190)):
            Circle(PATTERN_LINEAR_6_COPY_2_SKETCH_R)
    extrude(amount=-PATTERN_LINEAR_6_COPY_2_DEPTH, mode=Mode.SUBTRACT)

    # 阵列(线性)6 copy 3 sketch → 阵列(线性)6 copy 3 (cut)
    with BuildSketch(Plane(origin=(-2080, -80, 0), x_dir=(-1, 0, 0), z_dir=(0, 0, -1))):
        with Locations((-2150, 190)):
            Circle(PATTERN_LINEAR_6_COPY_3_SKETCH_R)
    extrude(amount=-PATTERN_LINEAR_6_COPY_3_DEPTH, mode=Mode.SUBTRACT)


solid = part.part
